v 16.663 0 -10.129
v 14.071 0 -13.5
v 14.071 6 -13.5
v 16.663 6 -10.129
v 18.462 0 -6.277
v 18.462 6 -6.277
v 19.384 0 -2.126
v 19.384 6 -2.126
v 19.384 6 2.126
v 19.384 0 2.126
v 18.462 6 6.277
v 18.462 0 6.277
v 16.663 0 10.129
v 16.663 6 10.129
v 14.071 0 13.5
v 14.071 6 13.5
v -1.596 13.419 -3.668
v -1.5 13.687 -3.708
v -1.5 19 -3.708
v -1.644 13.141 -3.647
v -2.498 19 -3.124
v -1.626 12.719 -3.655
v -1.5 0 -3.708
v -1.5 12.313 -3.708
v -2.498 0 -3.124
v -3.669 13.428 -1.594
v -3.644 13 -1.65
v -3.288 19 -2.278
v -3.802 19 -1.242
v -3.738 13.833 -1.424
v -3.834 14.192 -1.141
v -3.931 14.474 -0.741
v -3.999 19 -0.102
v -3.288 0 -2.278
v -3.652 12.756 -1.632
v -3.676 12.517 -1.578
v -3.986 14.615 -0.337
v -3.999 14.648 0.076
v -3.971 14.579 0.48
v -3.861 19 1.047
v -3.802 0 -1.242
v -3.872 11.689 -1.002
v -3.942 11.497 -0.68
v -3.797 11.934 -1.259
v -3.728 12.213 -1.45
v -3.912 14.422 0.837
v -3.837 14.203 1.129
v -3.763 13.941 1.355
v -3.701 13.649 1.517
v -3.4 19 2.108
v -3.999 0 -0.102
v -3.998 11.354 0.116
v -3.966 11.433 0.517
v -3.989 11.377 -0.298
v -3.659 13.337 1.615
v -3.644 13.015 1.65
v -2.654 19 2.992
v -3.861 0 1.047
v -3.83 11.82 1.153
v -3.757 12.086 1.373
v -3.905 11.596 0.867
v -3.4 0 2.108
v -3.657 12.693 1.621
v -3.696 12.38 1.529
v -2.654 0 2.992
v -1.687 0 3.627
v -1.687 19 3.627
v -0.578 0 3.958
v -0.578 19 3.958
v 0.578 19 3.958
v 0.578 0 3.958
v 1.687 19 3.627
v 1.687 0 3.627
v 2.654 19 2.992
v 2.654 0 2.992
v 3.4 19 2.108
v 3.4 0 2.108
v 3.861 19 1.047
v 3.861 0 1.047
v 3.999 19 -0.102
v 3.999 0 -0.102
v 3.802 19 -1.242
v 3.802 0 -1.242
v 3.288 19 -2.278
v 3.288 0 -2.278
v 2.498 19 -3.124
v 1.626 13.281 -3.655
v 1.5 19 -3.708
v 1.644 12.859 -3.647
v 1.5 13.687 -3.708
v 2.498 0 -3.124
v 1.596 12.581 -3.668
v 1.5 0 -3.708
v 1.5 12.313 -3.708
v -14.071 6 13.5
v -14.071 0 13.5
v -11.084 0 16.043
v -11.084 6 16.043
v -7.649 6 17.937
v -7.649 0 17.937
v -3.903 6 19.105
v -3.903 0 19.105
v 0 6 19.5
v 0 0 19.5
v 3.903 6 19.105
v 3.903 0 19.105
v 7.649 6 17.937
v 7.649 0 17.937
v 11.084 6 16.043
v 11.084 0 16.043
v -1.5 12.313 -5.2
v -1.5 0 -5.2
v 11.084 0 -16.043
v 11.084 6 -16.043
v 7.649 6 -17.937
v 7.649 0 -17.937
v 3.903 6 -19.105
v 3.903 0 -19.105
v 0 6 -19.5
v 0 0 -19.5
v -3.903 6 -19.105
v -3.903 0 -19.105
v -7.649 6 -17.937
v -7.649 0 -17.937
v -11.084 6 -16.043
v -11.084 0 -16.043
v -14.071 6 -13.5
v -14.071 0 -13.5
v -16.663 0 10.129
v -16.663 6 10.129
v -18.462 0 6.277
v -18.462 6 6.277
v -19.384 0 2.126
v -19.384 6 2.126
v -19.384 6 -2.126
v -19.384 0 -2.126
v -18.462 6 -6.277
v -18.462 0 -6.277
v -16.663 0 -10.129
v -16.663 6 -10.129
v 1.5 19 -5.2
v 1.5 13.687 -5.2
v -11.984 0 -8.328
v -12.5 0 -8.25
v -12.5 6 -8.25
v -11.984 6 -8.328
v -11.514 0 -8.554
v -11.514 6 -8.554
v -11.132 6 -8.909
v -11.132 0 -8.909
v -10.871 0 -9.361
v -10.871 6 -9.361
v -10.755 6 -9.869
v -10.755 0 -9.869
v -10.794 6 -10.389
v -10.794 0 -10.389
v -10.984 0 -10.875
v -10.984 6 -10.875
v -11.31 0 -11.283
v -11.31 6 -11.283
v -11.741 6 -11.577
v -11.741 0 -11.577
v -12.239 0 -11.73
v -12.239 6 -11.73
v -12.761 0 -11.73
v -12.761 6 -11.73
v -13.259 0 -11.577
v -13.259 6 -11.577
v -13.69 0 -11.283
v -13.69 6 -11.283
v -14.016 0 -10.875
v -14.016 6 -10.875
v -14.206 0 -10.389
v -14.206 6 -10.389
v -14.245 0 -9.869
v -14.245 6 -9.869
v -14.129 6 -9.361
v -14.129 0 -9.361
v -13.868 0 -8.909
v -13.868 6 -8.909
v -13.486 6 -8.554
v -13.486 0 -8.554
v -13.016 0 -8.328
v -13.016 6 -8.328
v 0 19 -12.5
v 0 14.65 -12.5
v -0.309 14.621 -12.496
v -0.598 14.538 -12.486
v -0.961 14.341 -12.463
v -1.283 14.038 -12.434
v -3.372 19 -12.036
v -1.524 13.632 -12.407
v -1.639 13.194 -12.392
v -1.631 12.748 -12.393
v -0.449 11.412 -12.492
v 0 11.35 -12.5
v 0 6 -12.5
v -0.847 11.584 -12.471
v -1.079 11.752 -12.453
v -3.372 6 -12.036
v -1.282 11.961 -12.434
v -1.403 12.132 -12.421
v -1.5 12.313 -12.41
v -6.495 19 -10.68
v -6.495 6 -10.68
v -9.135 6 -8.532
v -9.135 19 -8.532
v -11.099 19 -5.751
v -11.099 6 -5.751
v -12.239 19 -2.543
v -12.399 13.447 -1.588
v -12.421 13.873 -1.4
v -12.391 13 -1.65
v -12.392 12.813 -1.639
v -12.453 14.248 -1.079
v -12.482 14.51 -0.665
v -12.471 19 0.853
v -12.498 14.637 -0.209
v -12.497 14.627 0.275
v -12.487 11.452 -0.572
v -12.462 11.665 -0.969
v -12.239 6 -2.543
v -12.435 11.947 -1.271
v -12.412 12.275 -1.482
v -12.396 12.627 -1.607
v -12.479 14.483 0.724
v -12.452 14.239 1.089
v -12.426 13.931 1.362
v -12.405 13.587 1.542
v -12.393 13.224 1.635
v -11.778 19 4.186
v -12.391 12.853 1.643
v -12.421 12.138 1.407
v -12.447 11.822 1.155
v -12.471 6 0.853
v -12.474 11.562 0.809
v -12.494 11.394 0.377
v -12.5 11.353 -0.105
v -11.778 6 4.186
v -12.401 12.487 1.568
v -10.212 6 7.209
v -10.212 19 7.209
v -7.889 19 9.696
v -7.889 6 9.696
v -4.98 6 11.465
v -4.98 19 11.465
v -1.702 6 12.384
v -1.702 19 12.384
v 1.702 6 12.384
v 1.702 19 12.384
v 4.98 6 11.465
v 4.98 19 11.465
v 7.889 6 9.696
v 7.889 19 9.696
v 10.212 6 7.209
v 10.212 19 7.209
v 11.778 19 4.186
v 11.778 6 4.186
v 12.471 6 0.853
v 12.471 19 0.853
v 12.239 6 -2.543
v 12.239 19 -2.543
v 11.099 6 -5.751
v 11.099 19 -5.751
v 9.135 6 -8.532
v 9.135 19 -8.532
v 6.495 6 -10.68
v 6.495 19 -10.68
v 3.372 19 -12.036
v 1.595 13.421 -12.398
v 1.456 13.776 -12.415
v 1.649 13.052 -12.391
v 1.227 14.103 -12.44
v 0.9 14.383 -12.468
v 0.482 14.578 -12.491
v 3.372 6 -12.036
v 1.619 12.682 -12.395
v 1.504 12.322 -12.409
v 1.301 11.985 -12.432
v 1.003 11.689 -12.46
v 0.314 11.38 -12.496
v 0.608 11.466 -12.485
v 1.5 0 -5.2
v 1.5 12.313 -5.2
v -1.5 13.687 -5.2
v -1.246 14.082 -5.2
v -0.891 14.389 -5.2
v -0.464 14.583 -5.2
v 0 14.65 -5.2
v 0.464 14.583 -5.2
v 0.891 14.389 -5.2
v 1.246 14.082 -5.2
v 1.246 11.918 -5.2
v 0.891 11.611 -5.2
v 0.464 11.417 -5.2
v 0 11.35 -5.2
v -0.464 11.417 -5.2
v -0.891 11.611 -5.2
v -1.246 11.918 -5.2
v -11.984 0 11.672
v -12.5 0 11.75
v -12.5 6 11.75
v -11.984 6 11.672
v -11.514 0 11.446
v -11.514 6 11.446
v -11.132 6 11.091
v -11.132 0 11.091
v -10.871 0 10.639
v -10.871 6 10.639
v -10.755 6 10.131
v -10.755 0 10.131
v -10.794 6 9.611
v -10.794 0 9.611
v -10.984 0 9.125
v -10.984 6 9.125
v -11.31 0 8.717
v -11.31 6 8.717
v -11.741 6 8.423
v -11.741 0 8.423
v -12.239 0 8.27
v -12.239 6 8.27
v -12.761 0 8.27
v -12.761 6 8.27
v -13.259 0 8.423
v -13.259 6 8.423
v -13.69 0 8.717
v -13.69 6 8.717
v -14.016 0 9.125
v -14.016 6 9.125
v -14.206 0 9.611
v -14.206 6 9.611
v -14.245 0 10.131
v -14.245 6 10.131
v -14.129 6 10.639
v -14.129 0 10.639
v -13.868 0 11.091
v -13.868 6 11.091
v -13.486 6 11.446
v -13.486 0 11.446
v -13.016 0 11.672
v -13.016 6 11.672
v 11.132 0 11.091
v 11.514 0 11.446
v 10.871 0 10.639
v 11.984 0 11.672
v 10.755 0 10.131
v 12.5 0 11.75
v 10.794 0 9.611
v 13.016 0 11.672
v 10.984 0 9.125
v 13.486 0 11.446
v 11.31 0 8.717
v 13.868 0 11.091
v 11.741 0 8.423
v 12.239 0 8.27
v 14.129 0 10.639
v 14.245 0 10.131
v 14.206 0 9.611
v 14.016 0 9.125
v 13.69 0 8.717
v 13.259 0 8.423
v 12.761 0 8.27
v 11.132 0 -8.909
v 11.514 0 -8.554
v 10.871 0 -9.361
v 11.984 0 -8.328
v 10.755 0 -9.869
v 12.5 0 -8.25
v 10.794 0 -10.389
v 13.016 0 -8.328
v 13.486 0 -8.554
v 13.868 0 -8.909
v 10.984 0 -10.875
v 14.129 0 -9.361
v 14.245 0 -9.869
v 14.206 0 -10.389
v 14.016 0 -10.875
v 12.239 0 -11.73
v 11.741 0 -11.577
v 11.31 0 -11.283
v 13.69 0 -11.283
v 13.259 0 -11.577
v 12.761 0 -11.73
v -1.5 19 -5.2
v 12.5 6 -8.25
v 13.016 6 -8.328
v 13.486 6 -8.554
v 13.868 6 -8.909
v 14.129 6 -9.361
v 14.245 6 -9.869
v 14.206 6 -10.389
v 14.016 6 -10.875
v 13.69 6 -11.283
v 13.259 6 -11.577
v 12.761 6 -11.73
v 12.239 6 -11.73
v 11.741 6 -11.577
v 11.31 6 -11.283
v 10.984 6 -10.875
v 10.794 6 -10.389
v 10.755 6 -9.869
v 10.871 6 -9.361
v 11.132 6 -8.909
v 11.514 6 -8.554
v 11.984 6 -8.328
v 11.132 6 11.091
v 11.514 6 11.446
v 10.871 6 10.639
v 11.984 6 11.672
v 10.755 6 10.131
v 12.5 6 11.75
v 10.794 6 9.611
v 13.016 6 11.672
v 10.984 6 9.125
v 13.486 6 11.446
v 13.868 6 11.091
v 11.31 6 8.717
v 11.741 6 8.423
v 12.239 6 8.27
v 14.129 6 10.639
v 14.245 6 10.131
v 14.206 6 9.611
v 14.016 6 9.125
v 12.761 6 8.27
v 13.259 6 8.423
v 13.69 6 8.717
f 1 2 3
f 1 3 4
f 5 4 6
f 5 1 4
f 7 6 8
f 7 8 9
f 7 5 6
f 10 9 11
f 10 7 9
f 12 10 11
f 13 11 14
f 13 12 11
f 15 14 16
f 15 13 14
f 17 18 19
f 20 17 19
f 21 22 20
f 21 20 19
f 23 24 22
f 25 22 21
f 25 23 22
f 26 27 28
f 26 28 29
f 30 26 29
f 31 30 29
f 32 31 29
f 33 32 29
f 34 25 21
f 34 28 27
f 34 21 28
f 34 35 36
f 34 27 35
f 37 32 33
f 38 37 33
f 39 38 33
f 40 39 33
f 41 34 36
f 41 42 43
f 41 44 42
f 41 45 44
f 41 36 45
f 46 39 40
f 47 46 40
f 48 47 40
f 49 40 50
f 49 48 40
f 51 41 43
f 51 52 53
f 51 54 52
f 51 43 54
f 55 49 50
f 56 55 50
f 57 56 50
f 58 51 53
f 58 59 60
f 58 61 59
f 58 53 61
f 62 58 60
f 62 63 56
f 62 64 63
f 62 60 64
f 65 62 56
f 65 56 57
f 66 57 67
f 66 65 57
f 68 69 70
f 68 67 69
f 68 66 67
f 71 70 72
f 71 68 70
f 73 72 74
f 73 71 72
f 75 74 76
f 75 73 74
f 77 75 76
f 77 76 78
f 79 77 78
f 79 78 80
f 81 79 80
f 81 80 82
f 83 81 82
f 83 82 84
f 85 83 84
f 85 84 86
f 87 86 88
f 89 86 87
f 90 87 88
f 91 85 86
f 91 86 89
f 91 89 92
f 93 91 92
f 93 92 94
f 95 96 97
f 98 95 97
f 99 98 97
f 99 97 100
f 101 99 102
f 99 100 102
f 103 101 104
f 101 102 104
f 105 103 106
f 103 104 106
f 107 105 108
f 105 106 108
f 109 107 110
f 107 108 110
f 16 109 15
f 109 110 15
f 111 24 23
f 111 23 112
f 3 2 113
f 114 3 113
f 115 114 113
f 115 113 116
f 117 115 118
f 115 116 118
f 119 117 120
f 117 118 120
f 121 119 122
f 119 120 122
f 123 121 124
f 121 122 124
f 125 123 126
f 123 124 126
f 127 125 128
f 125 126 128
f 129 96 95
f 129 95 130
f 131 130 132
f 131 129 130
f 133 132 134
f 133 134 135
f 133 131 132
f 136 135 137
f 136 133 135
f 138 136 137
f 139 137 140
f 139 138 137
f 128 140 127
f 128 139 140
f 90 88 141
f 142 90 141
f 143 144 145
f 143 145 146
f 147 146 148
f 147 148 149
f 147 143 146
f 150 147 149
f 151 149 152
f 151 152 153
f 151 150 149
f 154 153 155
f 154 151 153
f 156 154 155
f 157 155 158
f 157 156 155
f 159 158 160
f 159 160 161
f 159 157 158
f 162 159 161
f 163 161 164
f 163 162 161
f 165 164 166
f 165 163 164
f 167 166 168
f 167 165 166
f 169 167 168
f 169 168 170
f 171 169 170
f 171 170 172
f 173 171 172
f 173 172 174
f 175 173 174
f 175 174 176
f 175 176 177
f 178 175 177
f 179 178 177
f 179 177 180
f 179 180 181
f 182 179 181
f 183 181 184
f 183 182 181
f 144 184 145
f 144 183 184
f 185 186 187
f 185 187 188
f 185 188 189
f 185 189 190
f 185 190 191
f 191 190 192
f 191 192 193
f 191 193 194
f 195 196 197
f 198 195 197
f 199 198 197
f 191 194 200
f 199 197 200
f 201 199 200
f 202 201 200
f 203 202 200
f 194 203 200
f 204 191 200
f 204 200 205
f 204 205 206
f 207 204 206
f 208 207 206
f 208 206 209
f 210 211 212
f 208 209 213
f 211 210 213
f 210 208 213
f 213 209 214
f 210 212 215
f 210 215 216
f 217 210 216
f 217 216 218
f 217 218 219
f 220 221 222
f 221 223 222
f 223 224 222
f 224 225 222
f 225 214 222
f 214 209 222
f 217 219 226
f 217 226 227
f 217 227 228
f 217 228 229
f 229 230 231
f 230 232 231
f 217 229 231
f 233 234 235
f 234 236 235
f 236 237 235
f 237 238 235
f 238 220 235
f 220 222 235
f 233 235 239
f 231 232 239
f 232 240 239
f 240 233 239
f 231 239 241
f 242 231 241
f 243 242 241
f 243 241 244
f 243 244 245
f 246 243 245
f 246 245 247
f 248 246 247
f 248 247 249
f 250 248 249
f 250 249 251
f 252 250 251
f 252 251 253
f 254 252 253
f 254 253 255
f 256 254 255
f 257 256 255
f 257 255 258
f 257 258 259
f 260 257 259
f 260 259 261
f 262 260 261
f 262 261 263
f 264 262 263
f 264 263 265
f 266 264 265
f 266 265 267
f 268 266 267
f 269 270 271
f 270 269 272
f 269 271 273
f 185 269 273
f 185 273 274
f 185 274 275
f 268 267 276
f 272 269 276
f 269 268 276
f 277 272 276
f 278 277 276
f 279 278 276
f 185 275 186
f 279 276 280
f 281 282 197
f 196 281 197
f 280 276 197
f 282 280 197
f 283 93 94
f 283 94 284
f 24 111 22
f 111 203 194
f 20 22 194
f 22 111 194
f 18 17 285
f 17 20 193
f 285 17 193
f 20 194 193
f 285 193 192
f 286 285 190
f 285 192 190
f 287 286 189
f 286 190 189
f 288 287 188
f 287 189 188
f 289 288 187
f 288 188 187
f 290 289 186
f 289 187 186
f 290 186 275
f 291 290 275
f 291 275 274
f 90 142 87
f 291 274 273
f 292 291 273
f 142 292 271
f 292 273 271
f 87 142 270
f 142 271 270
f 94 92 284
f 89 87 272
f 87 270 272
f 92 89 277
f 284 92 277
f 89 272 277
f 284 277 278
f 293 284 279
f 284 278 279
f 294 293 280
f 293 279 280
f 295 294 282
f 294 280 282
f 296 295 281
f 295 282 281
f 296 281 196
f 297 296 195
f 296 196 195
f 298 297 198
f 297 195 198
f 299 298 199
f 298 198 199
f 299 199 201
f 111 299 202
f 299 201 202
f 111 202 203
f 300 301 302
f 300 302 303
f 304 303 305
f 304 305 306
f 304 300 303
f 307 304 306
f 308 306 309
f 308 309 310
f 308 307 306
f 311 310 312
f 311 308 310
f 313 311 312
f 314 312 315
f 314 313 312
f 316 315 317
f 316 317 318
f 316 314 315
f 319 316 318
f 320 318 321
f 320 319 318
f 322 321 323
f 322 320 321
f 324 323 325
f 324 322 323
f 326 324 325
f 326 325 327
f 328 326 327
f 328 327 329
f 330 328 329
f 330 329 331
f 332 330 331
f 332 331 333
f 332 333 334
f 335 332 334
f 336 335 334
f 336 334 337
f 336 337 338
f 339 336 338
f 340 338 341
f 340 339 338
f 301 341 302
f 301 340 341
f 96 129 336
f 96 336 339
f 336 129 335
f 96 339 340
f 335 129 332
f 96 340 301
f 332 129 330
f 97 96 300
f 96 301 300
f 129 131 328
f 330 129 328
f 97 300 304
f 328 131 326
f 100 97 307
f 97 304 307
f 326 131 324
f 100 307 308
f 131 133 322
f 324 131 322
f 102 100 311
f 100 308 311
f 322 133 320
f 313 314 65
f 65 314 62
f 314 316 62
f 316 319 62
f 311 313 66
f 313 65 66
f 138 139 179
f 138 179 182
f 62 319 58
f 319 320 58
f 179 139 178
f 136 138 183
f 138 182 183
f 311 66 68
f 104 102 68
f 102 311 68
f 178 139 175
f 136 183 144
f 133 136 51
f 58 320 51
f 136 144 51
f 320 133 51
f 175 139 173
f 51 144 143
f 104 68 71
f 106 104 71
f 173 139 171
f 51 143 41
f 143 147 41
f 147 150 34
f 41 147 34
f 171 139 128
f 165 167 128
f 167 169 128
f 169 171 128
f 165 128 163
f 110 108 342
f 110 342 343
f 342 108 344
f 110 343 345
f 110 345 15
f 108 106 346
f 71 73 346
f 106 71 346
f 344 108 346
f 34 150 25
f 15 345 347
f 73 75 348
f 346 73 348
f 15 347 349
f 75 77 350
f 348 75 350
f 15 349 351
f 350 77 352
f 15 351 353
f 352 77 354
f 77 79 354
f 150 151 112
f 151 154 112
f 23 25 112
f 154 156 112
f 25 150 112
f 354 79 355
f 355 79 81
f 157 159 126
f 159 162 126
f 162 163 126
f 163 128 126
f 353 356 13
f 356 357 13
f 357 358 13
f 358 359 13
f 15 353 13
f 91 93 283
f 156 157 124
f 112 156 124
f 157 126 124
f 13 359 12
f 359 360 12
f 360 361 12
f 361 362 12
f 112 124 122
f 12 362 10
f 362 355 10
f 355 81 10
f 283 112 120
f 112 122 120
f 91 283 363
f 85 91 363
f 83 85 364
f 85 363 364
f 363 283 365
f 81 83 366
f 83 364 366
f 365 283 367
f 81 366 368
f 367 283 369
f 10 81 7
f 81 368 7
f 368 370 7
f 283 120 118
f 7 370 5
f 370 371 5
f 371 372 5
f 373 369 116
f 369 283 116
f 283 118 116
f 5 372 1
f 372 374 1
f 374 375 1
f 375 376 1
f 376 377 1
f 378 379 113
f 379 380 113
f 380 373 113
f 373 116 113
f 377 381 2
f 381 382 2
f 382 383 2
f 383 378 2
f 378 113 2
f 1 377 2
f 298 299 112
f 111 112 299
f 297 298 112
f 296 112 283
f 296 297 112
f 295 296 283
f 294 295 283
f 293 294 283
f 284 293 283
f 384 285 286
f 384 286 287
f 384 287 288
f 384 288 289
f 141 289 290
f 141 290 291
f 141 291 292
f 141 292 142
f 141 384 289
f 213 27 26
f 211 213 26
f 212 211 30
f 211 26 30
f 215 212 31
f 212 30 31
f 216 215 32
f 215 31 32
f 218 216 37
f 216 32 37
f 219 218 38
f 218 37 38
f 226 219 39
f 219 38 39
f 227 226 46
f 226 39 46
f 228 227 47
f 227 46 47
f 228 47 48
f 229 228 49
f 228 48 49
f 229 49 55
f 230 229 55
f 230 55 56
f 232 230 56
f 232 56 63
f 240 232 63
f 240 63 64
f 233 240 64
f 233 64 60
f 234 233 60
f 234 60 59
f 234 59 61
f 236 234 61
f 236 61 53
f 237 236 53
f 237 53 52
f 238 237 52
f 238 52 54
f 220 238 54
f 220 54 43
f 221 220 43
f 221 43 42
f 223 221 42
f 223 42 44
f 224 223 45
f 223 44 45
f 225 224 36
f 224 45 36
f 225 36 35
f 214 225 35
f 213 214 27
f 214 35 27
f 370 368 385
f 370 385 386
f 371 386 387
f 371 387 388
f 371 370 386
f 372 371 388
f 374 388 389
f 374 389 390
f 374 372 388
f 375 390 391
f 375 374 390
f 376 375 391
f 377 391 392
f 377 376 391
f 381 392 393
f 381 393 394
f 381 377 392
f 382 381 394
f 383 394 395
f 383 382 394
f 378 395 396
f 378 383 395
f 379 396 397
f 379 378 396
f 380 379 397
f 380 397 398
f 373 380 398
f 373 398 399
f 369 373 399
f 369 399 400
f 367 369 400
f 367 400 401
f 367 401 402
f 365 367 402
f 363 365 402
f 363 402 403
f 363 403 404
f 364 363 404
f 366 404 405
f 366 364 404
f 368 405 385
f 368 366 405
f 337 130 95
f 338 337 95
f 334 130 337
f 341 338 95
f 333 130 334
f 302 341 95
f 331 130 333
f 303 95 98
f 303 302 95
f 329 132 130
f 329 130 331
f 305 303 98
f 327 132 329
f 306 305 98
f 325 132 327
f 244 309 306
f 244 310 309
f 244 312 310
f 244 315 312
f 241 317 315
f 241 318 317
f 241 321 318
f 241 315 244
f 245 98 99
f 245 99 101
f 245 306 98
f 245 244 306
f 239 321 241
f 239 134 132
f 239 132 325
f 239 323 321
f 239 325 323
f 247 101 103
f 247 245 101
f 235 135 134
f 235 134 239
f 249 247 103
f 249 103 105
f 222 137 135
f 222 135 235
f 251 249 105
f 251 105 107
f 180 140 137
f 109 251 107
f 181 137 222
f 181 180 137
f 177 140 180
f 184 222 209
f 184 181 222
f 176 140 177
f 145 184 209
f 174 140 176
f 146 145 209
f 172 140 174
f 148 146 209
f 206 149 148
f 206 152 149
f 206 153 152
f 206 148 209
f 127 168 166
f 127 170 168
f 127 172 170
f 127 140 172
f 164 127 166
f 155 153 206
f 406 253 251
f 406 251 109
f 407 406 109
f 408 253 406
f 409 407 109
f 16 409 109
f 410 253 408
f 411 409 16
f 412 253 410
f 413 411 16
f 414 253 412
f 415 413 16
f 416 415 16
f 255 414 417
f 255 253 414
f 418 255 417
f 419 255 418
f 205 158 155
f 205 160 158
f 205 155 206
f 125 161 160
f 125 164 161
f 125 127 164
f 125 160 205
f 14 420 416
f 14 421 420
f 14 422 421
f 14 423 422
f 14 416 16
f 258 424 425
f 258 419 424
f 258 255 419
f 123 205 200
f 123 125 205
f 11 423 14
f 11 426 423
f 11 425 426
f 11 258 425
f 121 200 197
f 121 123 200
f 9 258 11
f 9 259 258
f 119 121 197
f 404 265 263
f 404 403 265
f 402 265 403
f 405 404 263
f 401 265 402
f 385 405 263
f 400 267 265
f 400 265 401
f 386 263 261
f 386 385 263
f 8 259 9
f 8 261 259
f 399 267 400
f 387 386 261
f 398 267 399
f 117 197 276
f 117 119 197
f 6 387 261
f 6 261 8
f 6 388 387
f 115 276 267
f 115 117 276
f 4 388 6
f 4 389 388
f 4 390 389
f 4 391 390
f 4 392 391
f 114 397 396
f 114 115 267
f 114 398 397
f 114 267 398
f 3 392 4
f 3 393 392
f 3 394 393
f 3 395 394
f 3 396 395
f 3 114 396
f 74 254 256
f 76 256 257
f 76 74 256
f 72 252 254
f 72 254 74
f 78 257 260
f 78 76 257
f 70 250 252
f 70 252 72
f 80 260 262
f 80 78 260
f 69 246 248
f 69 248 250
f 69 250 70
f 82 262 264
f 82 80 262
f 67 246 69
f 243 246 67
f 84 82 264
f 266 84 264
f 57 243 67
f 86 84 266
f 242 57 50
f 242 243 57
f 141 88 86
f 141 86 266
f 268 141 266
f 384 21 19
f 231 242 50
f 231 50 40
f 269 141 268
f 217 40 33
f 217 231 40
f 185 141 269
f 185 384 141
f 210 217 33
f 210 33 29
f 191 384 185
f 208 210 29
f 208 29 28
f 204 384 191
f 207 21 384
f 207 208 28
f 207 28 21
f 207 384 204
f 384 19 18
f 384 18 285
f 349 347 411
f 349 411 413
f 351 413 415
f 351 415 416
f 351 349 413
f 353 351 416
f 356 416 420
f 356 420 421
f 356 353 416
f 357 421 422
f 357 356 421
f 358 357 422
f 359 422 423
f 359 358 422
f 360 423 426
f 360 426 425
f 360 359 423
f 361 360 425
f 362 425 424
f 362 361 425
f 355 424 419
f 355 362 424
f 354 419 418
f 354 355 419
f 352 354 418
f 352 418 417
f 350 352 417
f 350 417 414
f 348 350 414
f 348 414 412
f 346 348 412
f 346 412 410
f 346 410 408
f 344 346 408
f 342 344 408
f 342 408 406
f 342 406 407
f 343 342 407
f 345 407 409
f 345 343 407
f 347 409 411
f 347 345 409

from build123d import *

# Parameters (mm, degrees)
SKETCH1_R           = 4
SKETCH1_R_2         = 1.75
BOSS_EXTRUDE1_DEPTH = 6
SKETCH2_R           = 12.5
SKETCH2_R_2         = 4
BOSS_EXTRUDE2_DEPTH = 13
SKETCH4_W           = 3
SKETCH4_H           = 2.4
CUT_EXTRUDE2_DEPTH  = 30
SKETCH3_R           = 1.65
CUT_EXTRUDE3_DEPTH  = 14
SKETCH5_R           = 1.65
CUT_EXTRUDE4_DEPTH  = 30
BOSS_EXTRUDE3_START = -6
BOSS_EXTRUDE3_DEPTH = 6


with BuildPart() as part:
    # Sketch1 → Boss-Extrude1 (new body)
    with BuildSketch(Plane(origin=(0, 0, 0), x_dir=(1, 0, 0), z_dir=(0, 1, 0))):
        with BuildLine():
            Line((-14.071247279, 13.5), (14.071247279, 13.5))
            ThreePointArc((14.071247279, 13.5), (19.5, 0), (14.071247279, -13.5))
            Line((14.071247279, -13.5), (-14.071247279, -13.5))
            ThreePointArc((-14.071247279, -13.5), (-19.5, 0), (-14.071247279, 13.5))
        make_face()
        with Locations(Location((0, 0, 0), (0, 0, 270))):
            Circle(SKETCH1_R, mode=Mode.SUBTRACT)
        with Locations(Location((-12.5, 10, 0), (0, 0, 270))):
            Circle(SKETCH1_R_2, mode=Mode.SUBTRACT)
        with Locations(Location((-12.5, -10, 0), (0, 0, 270))):
            Circle(SKETCH1_R_2, mode=Mode.SUBTRACT)
        with Locations(Location((12.5, -10, 0), (0, 0, 270))):
            Circle(SKETCH1_R_2, mode=Mode.SUBTRACT)
        with Locations(Location((12.5, 10, 0), (0, 0, 270))):
            Circle(SKETCH1_R_2, mode=Mode.SUBTRACT)
    extrude(amount=BOSS_EXTRUDE1_DEPTH)

    # Sketch2 → Boss-Extrude2 (add)
    with BuildSketch(Plane(origin=(0, 6, 0), x_dir=(1, 0, 0), z_dir=(0, 1, 0))):
        with Locations(Location((0, 0, 0), (0, 0, 90))):
            Circle(SKETCH2_R)
        with Locations(Location((0, 0, 0), (0, 0, 270))):
            Circle(SKETCH2_R_2, mode=Mode.SUBTRACT)
    extrude(amount=BOSS_EXTRUDE2_DEPTH)

    # Sketch4 → Cut-Extrude2 (cut)
    with BuildSketch(Plane(origin=(0, 19, 0), x_dir=(1, 0, 0), z_dir=(0, 1, 0))):
        with Locations((0, 4)):
            Rectangle(SKETCH4_W, SKETCH4_H)
    extrude(amount=-CUT_EXTRUDE2_DEPTH, mode=Mode.SUBTRACT)

    # Sketch3 → Cut-Extrude3 (cut)
    with BuildSketch(Plane(origin=(0, 0, -13.5), x_dir=(-1, 0, 0), z_dir=(0, 0, -1))):
        with Locations(Location((0, 13, 0), (0, 0, 335.380022671))):
            Circle(SKETCH3_R)
    extrude(amount=-CUT_EXTRUDE3_DEPTH, mode=Mode.SUBTRACT)

    # Sketch5 → Cut-Extrude4 (cut)
    with BuildSketch(Plane(origin=(0, 0, 0), x_dir=(0, 0, -1), z_dir=(1, 0, 0))):
        with Locations((0, 13)):
            Circle(SKETCH5_R)
    extrude(amount=-CUT_EXTRUDE4_DEPTH, mode=Mode.SUBTRACT)

    # Sketch6 → Boss-Extrude3 (add)
    with BuildSketch(Plane(origin=(0, 6, 0), x_dir=(1, 0, 0), z_dir=(0, 1, 0)).offset(BOSS_EXTRUDE3_START)):
        with BuildLine():
            Line((-14.071247279, 13.5), (14.071247279, 13.5))
            ThreePointArc((14.071247279, 13.5), (0, 19.5), (-14.071247279, 13.5))
        make_face()
        with BuildLine():
            Line((14.071247279, -13.5), (-14.071247279, -13.5))
            ThreePointArc((-14.071247279, -13.5), (0, -19.5), (14.071247279, -13.5))
        make_face()
    extrude(amount=BOSS_EXTRUDE3_DEPTH)


solid = part.part
